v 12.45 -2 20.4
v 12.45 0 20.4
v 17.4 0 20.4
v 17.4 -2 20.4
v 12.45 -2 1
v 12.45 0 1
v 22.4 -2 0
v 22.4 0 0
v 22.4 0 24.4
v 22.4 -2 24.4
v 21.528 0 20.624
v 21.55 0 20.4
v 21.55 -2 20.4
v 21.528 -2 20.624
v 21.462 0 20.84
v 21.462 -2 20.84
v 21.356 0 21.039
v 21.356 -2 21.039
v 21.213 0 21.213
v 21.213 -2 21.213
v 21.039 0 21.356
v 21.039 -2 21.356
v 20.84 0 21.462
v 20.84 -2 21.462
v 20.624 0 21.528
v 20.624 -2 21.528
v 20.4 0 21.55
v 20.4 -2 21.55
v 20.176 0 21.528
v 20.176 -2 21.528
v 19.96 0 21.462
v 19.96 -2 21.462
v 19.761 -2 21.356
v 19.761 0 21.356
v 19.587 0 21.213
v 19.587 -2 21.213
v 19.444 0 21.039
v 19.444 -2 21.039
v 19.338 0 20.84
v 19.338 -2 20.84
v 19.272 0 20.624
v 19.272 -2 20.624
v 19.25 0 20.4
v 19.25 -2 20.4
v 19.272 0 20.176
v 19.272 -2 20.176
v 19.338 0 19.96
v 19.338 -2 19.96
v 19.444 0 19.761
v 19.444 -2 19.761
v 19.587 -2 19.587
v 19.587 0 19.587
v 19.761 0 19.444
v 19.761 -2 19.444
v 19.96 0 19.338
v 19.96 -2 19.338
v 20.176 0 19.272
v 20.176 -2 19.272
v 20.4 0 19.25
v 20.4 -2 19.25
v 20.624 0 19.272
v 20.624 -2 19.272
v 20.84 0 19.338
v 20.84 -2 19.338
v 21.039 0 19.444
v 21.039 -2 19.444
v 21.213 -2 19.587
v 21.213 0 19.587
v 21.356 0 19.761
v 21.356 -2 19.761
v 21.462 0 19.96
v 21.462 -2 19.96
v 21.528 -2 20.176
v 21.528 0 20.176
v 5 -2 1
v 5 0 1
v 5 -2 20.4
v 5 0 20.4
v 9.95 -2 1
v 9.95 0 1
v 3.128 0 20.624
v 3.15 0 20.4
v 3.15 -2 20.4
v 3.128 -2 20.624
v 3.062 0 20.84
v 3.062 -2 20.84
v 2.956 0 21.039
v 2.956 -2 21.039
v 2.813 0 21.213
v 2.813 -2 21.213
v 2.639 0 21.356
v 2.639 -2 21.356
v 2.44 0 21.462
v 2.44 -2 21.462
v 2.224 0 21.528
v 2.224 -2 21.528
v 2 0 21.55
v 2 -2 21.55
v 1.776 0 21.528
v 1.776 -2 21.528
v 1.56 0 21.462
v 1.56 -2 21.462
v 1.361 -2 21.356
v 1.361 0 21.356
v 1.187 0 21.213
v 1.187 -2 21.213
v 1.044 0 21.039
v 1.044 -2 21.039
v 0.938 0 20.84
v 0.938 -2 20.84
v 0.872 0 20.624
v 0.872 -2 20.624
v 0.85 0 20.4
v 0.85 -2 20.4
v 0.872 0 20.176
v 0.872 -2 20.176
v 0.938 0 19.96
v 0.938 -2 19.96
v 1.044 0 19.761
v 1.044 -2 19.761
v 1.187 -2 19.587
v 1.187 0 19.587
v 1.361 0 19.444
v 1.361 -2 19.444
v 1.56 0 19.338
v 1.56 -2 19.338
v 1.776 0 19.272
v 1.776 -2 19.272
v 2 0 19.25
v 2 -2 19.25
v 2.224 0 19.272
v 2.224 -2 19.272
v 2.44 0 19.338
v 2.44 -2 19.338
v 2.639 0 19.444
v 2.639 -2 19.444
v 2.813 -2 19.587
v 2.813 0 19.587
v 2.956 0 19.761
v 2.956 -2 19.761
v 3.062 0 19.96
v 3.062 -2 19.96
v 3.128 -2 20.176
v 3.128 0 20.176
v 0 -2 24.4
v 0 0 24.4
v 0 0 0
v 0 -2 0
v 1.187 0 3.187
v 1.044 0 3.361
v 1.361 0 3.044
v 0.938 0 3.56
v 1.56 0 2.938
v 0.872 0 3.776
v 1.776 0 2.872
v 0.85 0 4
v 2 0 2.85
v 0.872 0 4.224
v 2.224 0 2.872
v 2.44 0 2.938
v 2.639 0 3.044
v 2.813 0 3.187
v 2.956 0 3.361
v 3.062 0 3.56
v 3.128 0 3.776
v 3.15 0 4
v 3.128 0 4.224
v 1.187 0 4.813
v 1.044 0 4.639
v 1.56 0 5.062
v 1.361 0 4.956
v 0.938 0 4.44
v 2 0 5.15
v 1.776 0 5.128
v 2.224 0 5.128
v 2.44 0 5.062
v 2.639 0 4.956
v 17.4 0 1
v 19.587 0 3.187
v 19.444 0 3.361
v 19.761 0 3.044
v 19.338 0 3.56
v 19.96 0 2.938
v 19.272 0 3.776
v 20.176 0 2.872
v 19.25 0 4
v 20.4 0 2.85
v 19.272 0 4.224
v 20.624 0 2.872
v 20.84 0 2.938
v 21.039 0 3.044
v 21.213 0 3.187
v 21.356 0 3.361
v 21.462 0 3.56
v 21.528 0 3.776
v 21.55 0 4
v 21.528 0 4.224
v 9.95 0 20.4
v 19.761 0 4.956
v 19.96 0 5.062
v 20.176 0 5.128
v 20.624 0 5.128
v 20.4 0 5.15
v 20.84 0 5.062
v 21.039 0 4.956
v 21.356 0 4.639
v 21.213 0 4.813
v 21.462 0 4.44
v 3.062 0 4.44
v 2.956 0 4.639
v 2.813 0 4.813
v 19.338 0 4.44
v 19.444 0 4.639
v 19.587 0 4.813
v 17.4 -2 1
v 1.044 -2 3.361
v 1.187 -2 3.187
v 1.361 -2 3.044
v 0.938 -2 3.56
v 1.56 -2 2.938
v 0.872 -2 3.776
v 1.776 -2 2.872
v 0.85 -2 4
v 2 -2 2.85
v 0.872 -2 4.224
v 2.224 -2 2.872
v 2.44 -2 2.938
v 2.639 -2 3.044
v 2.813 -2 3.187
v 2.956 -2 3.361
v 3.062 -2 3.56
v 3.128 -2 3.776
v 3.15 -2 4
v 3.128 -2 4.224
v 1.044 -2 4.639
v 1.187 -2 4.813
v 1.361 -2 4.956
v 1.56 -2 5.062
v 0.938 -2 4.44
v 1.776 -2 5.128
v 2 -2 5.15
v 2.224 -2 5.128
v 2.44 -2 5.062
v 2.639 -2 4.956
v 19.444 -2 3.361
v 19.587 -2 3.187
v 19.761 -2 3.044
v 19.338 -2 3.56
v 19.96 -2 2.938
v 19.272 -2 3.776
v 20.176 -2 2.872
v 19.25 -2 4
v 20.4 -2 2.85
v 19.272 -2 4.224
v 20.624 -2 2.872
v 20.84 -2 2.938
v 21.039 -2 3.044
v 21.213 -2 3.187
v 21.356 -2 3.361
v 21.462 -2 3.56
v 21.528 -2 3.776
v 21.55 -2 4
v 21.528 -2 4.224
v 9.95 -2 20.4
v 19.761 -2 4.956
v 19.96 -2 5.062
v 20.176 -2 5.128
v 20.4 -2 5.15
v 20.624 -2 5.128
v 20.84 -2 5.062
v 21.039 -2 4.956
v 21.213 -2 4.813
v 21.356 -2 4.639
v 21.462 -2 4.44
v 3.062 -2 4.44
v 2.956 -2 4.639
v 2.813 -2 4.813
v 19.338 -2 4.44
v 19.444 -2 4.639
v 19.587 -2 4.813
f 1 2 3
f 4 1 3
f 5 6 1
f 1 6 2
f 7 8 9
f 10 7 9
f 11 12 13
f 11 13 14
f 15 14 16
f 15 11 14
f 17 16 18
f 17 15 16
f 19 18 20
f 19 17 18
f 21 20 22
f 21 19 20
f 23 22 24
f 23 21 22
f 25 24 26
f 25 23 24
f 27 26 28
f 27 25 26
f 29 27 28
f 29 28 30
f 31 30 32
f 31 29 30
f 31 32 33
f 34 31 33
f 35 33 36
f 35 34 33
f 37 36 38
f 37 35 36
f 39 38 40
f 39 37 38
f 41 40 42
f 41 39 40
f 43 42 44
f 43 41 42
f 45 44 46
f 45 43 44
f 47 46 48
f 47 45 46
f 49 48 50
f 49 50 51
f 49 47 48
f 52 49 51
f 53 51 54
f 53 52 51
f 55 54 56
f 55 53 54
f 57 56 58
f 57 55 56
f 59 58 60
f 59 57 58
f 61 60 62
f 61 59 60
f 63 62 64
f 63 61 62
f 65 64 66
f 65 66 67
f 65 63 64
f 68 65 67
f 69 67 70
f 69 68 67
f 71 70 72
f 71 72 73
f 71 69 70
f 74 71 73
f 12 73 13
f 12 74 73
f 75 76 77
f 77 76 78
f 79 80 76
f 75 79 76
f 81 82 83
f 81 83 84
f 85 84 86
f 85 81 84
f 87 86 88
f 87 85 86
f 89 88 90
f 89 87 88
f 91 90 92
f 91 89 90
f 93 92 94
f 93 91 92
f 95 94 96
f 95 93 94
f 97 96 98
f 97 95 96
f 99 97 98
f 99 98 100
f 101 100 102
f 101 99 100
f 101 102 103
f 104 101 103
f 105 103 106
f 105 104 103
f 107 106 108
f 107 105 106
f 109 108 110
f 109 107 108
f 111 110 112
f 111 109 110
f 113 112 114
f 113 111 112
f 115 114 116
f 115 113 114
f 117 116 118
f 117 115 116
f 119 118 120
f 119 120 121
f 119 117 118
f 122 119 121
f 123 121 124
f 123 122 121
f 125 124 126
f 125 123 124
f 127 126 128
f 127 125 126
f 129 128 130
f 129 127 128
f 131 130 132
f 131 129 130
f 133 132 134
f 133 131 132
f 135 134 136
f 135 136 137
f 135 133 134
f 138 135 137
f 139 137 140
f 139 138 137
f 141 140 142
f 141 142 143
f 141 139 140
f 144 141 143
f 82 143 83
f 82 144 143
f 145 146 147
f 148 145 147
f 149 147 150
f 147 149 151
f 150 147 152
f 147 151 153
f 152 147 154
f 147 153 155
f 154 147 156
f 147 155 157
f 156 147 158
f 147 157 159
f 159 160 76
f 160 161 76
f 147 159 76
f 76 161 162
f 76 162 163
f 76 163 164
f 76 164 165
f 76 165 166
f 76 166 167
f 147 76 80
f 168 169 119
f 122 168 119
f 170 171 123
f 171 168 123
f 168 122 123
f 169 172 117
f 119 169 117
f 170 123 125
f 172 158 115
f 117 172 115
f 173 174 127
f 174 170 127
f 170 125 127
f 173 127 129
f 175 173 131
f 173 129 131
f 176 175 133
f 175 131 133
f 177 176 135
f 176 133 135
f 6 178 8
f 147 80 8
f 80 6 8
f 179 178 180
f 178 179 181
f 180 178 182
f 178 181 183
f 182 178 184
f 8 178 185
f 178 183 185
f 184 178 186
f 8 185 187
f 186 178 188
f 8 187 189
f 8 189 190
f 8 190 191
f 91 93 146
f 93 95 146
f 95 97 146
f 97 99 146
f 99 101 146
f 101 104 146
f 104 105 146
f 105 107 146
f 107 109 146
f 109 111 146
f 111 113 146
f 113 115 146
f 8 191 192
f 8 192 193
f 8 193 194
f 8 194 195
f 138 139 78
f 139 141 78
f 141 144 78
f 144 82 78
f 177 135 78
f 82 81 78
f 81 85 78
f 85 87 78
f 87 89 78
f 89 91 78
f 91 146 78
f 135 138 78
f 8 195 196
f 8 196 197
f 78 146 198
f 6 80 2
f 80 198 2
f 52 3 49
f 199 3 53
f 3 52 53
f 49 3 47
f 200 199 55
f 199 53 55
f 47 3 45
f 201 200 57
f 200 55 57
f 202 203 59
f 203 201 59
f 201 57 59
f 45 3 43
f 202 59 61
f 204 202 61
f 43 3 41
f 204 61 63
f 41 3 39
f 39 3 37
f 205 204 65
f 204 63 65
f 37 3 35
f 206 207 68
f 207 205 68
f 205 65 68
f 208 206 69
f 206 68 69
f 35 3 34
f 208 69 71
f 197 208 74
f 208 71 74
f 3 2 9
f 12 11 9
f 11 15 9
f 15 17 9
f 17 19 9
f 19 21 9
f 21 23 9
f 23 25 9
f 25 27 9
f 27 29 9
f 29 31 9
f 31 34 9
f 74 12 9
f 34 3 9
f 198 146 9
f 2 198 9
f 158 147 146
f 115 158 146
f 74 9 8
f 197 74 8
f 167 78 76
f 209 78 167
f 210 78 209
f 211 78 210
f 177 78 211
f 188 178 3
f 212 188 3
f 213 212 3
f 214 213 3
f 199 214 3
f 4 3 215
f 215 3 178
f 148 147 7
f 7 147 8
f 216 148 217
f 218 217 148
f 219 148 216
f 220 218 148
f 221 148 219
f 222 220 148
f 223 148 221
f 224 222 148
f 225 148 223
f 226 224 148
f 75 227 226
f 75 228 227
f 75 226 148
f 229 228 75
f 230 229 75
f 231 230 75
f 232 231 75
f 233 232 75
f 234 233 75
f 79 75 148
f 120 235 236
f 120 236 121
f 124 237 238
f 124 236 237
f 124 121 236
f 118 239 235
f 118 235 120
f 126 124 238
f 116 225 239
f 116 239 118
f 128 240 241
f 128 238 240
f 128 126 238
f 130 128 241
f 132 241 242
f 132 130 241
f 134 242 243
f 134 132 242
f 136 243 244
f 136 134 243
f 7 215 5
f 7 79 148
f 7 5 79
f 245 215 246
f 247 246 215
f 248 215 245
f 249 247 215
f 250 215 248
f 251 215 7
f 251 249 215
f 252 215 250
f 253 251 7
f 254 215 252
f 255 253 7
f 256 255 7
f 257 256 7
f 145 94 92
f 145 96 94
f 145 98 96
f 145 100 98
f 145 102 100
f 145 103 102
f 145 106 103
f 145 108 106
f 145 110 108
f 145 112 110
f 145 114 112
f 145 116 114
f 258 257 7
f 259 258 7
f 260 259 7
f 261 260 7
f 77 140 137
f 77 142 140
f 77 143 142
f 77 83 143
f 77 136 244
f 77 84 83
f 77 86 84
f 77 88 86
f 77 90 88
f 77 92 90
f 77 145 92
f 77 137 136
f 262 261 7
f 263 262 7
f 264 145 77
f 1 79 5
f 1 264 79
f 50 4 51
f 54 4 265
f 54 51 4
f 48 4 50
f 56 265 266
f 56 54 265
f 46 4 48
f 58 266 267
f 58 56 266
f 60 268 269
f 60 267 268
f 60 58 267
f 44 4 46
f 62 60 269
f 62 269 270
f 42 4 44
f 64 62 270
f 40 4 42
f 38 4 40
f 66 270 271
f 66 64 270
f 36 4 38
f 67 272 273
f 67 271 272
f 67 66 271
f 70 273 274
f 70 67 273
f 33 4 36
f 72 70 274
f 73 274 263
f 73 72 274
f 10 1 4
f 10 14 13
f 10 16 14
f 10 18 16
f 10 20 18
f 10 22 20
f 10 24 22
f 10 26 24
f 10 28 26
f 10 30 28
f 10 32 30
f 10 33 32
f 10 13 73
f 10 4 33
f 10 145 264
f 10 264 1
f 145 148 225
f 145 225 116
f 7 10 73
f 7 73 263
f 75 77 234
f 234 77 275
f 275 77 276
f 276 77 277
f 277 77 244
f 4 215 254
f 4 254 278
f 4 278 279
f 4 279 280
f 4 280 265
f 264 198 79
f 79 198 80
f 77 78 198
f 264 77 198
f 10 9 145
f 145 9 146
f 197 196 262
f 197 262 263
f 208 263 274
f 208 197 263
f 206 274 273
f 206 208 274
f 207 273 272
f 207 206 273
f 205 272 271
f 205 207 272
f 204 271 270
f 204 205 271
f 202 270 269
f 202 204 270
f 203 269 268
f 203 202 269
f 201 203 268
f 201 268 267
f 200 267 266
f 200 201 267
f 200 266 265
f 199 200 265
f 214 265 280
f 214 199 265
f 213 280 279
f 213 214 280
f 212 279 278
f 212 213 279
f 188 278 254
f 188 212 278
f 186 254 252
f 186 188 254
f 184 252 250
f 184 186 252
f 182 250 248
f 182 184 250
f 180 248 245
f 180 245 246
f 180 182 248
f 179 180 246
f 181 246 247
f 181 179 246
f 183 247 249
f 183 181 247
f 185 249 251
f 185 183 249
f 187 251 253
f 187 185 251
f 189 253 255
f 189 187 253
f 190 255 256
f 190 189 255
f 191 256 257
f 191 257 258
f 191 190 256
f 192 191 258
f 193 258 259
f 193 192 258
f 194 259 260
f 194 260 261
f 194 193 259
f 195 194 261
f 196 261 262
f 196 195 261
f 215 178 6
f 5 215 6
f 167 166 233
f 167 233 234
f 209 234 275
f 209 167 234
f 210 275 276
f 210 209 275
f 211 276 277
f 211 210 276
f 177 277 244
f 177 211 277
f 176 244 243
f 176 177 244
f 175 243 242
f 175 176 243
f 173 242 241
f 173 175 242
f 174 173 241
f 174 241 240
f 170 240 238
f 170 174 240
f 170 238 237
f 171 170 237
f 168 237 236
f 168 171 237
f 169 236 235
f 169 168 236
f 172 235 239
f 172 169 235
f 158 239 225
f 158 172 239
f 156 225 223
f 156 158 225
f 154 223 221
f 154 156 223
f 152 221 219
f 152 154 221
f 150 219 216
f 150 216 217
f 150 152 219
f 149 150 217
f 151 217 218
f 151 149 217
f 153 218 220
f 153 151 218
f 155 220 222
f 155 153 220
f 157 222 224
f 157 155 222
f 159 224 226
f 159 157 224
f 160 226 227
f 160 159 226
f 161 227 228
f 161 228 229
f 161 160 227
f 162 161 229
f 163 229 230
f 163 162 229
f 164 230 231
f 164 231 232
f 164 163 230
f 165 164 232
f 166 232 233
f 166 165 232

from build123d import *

# Parameters (mm, degrees)
F0_W     = 1.2
F0_H     = 1
F0_W_2   = 1.5
F0_W_3   = 4
F0_H_2   = 2
F0_R     = 1.15
F0_W_4   = 1
F0_H_3   = 4
F0_H_4   = 12.4
F0_W_5   = 4.95
F1_DEPTH = 2


with BuildPart() as f1:
    # F0 (on Front) → F1 (new body)
    with BuildSketch(Plane.XZ):
        with Locations((16.8, 0.5)):
            Rectangle(F0_W, F0_H)
        with Locations((15.45, 0.5)):
            Rectangle(F0_W_2, F0_H)
        Polygon((14.7, 0), (14.7, 1), (12.45, 1), (11.2, 1), (9.95, 1), (7.7, 1), (7.7, 0), align=None)
        Polygon((17.4, 20.4), (17.4, 1), (17.4, 0), (18.4, 0), (18.4, 2), (18.4, 6), (18.4, 18.4), (18.4, 20.4), align=None)
        with Locations((6.95, 0.5)):
            Rectangle(F0_W_2, F0_H)
        with Locations((20.4, 1)):
            Rectangle(F0_W_3, F0_H_2)
        Polygon((18.4, 22.4), (18.4, 20.4), (18.4, 18.4), (22.4, 18.4), (22.4, 22.4), align=None)
        with Locations((20.4, 20.4)):
            Circle(F0_R, mode=Mode.SUBTRACT)
        with Locations((17.9, 23.4)):
            Rectangle(F0_W_4, F0_H_2)
        Polygon((12.45, 22.4), (17.4, 22.4), (17.4, 24.4), (11.2, 24.4), (11.2, 22.4), align=None)
        with Locations((5.6, 0.5)):
            Rectangle(F0_W, F0_H)
        with Locations((20.4, 4)):
            Rectangle(F0_W_3, F0_H_3)
        with Locations((20.4, 4)):
            Circle(F0_R, mode=Mode.SUBTRACT)
        with Locations((20.4, 12.2)):
            Rectangle(F0_W_3, F0_H_4)
        with Locations((20.4, 23.4)):
            Rectangle(F0_W_3, F0_H_2)
        Polygon((4, 0), (5, 0), (5, 1), (5, 20.4), (4, 20.4), (4, 18.4), (4, 6), (4, 2), align=None)
        Polygon((9.95, 22.4), (11.2, 22.4), (11.2, 24.4), (5, 24.4), (5, 22.4), align=None)
        with Locations((2, 1)):
            Rectangle(F0_W_3, F0_H_2)
        with Locations((4.5, 23.4)):
            Rectangle(F0_W_4, F0_H_2)
        with Locations((2, 4)):
            Rectangle(F0_W_3, F0_H_3)
        with Locations((2, 4)):
            Circle(F0_R, mode=Mode.SUBTRACT)
        Polygon((4, 18.4), (4, 20.4), (4, 22.4), (0, 22.4), (0, 18.4), align=None)
        with Locations((2, 20.4)):
            Circle(F0_R, mode=Mode.SUBTRACT)
        with Locations((2, 23.4)):
            Rectangle(F0_W_3, F0_H_2)
        with Locations((2, 12.2)):
            Rectangle(F0_W_3, F0_H_4)
        Polygon((11.2, 1), (12.45, 1), (12.45, 20.4), (11.2, 20.4), (9.95, 20.4), (9.95, 1), align=None)
        with Locations((7.475, 21.4)):
            Rectangle(F0_W_5, F0_H_2)
        with Locations((4.5, 21.4)):
            Rectangle(F0_W_4, F0_H_2)
        Polygon((11.2, 20.4), (12.45, 20.4), (12.45, 22.4), (11.2, 22.4), (9.95, 22.4), (9.95, 20.4), align=None)
        with Locations((17.9, 21.4)):
            Rectangle(F0_W_4, F0_H_2)
        with Locations((14.925, 21.4)):
            Rectangle(F0_W_5, F0_H_2)
    extrude(amount=F1_DEPTH)


solid = f1.part
